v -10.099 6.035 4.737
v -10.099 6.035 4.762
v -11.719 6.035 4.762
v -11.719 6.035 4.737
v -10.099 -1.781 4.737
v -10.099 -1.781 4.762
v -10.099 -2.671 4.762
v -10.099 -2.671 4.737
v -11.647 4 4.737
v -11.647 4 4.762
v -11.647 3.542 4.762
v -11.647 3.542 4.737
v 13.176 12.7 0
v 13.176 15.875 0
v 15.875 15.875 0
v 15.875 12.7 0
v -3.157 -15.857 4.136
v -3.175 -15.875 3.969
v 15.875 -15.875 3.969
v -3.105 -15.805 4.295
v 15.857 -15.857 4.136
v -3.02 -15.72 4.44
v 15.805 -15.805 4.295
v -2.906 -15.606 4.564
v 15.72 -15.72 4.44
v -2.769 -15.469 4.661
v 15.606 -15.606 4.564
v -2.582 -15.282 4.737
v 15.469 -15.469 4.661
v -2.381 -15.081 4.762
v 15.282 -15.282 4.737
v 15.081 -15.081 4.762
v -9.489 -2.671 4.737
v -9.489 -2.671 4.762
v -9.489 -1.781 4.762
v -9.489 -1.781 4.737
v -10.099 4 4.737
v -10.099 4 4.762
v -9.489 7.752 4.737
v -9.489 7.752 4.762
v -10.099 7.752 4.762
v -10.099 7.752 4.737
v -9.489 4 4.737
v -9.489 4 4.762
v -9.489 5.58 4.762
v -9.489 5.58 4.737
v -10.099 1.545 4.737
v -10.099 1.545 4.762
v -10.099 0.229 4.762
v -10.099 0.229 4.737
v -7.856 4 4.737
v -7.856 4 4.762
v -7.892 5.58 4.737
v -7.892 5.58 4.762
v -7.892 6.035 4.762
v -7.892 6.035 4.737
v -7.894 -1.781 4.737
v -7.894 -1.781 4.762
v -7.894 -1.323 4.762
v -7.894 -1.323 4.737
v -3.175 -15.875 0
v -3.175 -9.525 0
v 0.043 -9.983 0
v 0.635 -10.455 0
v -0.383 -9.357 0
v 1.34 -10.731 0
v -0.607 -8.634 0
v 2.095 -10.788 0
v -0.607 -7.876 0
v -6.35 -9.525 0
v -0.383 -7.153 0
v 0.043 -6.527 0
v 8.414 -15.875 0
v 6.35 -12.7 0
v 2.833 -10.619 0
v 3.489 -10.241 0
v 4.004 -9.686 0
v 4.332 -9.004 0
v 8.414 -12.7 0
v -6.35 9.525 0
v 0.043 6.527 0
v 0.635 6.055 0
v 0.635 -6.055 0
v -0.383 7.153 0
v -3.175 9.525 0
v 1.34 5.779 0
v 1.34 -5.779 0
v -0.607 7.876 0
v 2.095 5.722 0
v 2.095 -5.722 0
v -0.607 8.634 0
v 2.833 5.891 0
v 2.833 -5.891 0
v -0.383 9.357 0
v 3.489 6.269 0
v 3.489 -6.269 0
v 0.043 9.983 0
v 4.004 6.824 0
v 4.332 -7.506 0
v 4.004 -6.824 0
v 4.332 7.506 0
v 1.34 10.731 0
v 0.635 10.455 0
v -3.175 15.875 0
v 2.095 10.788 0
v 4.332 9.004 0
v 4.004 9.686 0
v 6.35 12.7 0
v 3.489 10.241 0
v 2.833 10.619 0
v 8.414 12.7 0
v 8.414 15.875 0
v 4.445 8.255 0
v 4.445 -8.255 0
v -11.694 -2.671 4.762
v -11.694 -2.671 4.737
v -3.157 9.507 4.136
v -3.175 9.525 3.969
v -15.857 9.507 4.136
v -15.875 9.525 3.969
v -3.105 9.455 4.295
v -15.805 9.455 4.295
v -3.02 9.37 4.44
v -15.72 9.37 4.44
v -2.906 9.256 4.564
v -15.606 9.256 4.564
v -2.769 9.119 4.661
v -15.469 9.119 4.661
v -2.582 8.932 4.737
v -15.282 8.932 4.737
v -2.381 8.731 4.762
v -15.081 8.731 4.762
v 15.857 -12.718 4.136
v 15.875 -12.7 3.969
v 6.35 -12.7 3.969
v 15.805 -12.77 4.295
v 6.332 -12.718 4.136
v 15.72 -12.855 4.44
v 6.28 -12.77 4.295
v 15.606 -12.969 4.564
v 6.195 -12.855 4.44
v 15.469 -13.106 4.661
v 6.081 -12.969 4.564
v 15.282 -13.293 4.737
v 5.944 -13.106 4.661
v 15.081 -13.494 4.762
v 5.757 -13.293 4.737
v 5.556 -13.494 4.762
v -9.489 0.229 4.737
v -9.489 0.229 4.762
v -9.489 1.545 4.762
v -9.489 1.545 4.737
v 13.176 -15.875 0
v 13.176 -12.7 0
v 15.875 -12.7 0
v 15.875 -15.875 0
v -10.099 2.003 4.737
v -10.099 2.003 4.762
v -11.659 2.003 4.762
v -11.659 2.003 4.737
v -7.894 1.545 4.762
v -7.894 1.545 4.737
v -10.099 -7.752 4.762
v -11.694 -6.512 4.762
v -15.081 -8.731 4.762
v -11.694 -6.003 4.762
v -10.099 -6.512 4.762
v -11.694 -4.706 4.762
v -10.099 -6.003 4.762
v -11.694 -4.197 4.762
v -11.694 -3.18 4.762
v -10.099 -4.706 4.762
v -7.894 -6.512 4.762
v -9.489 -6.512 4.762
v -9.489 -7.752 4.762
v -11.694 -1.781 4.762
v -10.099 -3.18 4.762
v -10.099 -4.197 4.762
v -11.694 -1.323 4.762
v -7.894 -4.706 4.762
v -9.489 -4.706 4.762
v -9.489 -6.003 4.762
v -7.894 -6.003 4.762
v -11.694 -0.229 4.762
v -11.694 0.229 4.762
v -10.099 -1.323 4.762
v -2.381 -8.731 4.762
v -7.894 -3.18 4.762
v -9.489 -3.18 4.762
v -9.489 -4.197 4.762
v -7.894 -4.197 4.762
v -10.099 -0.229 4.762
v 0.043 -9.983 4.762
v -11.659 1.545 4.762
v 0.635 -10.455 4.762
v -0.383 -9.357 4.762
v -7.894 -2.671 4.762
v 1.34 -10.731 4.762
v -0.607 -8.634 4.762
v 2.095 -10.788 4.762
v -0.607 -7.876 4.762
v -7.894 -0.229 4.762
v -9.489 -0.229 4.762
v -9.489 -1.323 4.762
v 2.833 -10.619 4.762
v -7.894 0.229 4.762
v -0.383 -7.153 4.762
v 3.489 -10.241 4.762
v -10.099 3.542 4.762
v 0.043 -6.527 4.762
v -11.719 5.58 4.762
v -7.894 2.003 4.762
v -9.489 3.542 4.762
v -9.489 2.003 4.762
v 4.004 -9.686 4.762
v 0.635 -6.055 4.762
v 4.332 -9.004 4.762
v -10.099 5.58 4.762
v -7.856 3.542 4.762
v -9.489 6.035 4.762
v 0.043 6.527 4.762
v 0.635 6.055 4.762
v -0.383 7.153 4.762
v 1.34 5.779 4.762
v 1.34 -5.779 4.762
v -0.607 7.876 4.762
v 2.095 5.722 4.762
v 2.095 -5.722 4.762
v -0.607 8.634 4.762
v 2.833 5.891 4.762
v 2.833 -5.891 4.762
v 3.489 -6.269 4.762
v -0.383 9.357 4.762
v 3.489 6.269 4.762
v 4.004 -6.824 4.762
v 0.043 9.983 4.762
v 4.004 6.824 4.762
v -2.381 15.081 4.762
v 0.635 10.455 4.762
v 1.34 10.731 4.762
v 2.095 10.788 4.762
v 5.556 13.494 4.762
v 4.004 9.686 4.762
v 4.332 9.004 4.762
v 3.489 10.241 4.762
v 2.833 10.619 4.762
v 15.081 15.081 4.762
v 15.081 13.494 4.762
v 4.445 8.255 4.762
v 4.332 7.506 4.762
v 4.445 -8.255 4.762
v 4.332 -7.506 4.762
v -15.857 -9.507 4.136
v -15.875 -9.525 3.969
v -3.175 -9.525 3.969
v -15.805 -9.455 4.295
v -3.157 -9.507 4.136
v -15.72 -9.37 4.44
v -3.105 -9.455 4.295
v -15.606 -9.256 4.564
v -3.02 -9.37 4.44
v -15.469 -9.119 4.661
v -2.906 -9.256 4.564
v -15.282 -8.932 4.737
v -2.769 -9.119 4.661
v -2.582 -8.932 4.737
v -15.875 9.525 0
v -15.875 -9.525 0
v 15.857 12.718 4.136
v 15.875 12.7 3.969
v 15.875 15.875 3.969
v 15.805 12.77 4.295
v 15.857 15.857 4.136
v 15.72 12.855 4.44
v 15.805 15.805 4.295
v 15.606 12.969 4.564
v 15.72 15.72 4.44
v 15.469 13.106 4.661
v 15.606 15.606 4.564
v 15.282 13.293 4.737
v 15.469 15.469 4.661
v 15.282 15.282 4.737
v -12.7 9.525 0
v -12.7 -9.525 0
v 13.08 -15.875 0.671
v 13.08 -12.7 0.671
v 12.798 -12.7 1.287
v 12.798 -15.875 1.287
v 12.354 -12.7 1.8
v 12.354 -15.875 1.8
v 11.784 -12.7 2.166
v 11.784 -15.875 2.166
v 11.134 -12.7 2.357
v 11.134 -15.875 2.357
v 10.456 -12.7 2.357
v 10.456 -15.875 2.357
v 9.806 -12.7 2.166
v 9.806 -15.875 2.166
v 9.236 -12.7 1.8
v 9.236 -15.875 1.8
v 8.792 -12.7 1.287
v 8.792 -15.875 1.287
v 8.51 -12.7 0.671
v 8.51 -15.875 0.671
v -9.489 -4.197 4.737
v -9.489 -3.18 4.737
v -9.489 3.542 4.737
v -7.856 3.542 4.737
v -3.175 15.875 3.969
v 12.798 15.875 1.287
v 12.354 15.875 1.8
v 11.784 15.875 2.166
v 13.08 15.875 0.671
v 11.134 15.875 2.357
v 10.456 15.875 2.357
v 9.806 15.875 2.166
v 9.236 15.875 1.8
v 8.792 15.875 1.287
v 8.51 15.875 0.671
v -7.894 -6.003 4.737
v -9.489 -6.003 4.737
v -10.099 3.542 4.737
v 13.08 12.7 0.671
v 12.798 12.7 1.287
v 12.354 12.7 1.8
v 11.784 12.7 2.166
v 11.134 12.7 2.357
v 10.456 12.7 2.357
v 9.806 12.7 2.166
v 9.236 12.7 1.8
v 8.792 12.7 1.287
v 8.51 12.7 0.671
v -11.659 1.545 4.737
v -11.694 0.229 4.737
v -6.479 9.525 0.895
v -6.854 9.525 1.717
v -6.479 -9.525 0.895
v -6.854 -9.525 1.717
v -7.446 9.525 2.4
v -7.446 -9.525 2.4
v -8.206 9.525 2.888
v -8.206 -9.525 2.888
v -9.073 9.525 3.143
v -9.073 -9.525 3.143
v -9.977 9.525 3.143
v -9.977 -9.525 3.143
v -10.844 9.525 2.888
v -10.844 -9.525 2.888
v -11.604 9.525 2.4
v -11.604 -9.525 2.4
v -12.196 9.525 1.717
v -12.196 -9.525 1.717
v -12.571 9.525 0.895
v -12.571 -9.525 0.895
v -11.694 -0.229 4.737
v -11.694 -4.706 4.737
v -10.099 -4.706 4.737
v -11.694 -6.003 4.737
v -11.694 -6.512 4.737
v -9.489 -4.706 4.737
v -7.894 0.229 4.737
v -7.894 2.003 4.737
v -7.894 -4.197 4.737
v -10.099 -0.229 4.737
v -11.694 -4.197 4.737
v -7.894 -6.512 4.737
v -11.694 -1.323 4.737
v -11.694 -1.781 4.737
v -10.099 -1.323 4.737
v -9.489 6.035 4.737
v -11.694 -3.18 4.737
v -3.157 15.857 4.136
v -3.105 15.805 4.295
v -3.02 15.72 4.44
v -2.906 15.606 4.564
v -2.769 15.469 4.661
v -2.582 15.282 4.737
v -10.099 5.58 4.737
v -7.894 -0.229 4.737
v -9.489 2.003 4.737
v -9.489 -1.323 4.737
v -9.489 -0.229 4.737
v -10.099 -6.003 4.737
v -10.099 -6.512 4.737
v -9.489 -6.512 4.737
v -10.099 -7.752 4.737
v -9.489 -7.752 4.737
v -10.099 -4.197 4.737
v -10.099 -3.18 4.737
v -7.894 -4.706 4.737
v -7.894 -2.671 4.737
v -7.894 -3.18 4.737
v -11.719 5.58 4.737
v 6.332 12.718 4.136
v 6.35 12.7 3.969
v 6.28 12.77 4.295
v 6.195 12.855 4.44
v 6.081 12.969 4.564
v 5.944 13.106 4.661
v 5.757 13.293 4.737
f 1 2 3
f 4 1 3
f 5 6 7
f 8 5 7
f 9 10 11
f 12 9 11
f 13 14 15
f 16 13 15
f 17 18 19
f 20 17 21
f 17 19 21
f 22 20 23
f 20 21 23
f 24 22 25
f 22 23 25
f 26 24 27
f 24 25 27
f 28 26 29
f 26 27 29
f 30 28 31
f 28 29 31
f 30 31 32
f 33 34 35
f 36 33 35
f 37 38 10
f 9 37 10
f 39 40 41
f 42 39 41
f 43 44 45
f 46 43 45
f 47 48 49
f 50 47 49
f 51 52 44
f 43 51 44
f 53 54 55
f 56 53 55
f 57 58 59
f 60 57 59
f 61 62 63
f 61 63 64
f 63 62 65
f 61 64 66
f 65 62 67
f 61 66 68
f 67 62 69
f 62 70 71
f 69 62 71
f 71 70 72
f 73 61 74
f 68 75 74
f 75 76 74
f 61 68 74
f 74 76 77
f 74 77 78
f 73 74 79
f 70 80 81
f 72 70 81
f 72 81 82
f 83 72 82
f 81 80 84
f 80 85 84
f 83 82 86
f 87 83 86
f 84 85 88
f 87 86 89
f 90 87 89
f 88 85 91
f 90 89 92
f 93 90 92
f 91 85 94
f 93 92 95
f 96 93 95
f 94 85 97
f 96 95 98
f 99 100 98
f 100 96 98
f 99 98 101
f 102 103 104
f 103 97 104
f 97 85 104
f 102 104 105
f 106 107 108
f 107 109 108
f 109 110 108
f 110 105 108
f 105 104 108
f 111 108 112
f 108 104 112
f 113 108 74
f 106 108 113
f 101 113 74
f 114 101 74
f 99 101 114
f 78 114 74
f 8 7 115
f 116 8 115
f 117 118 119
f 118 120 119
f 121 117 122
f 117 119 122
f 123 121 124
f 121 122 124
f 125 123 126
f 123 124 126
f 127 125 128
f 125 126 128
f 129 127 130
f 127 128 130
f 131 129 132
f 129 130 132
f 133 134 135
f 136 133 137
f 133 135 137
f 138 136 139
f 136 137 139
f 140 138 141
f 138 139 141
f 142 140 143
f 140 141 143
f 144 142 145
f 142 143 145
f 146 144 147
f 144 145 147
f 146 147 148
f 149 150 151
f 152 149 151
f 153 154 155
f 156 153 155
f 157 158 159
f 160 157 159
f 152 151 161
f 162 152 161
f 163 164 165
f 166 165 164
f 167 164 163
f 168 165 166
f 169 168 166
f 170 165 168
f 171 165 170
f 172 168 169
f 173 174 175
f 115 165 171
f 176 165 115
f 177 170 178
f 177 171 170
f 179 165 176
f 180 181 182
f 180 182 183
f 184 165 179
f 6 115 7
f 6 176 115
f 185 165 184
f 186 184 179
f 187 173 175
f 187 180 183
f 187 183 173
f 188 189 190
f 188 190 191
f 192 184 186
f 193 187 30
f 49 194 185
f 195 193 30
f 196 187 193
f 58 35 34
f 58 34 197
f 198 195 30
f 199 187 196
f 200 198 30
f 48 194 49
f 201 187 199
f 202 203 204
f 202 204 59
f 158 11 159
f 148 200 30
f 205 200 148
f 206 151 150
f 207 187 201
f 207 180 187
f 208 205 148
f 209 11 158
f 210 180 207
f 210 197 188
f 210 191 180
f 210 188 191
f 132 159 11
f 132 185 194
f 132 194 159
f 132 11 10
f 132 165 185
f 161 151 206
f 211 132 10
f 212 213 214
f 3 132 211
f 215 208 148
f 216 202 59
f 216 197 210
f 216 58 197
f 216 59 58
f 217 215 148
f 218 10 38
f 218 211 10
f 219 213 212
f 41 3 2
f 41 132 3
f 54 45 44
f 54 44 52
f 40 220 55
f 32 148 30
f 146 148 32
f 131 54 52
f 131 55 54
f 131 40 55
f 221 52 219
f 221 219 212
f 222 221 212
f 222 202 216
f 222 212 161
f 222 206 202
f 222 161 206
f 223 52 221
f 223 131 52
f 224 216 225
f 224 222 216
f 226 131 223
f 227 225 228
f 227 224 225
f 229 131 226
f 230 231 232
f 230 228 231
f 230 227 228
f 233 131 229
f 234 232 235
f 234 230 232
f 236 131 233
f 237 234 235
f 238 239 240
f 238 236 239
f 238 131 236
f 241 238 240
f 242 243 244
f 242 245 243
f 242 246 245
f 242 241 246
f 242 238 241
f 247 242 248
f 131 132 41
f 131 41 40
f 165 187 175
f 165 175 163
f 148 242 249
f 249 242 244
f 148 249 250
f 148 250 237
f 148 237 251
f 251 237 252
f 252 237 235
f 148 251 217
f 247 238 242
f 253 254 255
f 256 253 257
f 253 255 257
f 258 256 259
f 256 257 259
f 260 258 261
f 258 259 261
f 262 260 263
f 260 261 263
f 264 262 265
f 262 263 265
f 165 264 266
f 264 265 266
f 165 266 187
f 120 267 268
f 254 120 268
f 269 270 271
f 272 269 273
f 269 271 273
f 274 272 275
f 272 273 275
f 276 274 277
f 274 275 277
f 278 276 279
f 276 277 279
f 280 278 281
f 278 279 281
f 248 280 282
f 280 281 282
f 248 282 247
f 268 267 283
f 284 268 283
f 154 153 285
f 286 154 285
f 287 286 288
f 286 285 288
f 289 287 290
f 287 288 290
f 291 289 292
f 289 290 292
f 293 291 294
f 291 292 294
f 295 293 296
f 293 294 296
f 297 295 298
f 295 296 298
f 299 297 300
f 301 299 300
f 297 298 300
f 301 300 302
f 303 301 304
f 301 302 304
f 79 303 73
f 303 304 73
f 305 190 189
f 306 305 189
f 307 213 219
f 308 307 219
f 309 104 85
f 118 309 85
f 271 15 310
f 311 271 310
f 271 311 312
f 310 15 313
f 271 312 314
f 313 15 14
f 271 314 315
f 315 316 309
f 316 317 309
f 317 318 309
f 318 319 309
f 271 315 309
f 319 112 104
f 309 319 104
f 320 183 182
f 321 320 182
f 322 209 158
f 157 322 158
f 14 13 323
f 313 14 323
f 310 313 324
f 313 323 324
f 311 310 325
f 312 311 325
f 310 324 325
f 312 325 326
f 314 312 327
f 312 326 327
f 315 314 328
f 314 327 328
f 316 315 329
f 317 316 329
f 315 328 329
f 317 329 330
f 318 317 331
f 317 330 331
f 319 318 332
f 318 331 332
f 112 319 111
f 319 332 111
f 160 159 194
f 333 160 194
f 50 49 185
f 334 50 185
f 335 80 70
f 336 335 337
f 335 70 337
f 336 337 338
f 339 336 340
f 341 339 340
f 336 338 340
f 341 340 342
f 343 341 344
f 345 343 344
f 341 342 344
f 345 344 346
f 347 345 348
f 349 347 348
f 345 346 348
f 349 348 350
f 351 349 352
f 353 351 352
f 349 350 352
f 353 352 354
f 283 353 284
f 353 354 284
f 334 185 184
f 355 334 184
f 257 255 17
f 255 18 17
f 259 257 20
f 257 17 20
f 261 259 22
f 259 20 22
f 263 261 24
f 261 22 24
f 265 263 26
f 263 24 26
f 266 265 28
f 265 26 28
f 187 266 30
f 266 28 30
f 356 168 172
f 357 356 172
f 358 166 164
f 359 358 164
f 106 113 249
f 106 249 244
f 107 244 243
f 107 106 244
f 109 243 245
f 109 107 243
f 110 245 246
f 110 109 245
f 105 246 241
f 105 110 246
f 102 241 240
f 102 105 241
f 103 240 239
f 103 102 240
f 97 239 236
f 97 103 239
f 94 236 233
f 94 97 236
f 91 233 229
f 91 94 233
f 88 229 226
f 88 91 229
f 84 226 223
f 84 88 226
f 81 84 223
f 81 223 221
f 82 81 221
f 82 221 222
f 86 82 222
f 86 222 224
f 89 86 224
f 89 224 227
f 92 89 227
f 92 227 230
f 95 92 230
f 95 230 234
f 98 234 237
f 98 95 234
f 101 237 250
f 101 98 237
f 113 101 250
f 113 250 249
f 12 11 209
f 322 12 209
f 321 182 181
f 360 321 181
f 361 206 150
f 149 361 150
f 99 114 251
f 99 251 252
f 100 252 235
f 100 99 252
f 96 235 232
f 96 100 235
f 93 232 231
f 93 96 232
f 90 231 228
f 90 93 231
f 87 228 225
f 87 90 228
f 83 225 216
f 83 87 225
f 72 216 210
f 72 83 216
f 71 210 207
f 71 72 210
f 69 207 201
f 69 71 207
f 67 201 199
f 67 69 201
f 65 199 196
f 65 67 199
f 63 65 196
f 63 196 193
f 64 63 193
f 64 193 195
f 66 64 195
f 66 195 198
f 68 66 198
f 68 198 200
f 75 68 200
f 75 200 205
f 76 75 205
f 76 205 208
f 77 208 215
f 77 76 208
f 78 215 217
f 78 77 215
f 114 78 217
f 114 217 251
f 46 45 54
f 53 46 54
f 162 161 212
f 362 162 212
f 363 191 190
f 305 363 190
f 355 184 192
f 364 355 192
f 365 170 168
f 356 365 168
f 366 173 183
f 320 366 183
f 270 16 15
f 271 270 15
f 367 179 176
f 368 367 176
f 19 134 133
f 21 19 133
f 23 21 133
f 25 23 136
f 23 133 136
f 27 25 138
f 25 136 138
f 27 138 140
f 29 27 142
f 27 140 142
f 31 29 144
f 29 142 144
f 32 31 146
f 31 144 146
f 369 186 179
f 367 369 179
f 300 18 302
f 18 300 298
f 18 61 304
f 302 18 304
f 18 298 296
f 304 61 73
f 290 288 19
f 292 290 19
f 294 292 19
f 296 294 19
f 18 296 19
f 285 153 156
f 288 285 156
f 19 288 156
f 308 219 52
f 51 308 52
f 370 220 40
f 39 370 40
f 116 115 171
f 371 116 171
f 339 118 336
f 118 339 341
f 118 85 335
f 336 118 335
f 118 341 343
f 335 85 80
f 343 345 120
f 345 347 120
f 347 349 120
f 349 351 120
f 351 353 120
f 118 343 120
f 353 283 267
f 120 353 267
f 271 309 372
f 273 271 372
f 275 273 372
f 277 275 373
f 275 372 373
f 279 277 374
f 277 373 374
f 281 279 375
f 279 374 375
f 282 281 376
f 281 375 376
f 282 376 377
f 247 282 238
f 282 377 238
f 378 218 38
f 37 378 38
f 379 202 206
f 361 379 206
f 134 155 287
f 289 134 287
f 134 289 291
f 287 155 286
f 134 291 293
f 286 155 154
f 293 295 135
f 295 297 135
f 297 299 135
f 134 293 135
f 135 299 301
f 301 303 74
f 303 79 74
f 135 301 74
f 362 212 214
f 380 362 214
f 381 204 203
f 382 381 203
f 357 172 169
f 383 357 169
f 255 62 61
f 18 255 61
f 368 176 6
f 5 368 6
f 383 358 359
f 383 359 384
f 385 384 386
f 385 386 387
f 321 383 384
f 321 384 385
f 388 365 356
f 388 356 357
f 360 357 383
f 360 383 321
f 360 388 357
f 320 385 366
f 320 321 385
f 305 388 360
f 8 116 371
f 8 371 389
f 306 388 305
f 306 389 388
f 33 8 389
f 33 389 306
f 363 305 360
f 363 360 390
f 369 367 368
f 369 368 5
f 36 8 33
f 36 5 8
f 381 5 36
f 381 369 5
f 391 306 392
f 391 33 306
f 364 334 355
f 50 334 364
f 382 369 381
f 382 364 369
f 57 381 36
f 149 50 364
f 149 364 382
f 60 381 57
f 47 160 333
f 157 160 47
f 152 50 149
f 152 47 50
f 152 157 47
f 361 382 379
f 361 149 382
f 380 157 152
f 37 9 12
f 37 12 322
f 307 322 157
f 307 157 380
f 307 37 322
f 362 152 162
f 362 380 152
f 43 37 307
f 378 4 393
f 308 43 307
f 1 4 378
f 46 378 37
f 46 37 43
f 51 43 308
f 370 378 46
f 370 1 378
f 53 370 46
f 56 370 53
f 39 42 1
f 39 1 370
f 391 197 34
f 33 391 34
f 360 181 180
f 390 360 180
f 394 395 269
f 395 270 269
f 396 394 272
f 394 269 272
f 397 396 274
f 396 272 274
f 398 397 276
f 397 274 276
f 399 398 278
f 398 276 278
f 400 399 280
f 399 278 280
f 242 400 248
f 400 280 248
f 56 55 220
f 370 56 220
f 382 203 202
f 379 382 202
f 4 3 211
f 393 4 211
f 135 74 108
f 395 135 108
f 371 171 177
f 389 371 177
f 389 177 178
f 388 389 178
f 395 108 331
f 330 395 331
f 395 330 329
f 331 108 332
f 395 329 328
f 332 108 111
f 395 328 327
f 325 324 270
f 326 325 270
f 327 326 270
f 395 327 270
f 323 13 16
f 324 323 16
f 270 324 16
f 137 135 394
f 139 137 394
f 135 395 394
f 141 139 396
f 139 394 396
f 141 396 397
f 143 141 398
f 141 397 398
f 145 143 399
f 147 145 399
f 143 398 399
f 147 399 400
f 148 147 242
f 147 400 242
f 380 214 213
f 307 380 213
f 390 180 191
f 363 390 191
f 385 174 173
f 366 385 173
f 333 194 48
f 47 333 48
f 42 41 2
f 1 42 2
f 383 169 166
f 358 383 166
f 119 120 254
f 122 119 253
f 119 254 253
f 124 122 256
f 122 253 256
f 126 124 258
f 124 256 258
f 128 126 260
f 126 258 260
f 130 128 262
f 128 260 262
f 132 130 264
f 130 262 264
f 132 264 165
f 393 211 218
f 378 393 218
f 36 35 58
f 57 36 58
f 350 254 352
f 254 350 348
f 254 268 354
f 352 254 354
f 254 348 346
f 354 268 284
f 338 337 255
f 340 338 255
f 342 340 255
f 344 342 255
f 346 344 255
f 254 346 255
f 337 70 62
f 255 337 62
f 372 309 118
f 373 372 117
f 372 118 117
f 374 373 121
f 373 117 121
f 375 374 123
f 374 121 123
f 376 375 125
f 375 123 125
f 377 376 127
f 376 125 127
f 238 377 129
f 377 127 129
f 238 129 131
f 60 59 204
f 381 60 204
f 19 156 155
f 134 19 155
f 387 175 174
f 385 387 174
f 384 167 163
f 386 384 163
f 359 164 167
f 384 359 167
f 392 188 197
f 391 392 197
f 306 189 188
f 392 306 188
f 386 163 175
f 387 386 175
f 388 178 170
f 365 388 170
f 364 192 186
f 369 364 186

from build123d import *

# Parameters (mm, degrees)
F0_R     = 2.54
F1_DEPTH = 4.7625
F2_R     = 0.79375
F4_DEPTH = 25.401
F6_DEPTH = 31.751
F8_DEPTH = 0.0254


with BuildPart() as f1:
    # F0 (on Top) → F1 (new body)
    with BuildSketch(Plane.XY):
        Polygon((15.875, 12.7), (15.875, 15.875), (-3.175, 15.875), (-3.175, 9.525), (-15.875, 9.525), (-15.875, -9.525), (-3.175, -9.525), (-3.175, -15.875), (15.875, -15.875), (15.875, -12.7), (6.35, -12.7), (6.35, 12.7), align=None)
        with Locations((1.905, -8.255)):
            Circle(F0_R, mode=Mode.SUBTRACT)
        with Locations((1.905, 8.255)):
            Circle(F0_R, mode=Mode.SUBTRACT)
    extrude(amount=F1_DEPTH)

    # F2
    f2_edges = [f1.edges().sort_by_distance(p)[0] for p in [
        (-9.525, 9.525, 4.7625),
        (-9.525, -9.525, 4.7625),
        (6.35, 15.875, 4.7625),
        (11.1125, 12.7, 4.7625),
        (6.35, 0, 4.7625),
        (15.875, 14.2875, 4.7625),
        (11.1125, -12.7, 4.7625),
        (15.875, -14.2875, 4.7625),
        (6.35, -15.875, 4.7625),
        (-3.175, -12.7, 4.7625),
        (-15.875, 0, 4.7625),
        (-3.175, 12.7, 4.7625),
    ]]
    fillet(f2_edges, radius=F2_R)

    # F3 (on face) → F4 (cut, through all)
    with BuildSketch(Plane.XZ.offset(9.525)):
        with BuildLine():
            Line((-12.7, 0), (-6.35, 0))
            ThreePointArc((-6.35, 0), (-9.525, 3.175), (-12.7, 0))
        make_face()
    extrude(amount=-F4_DEPTH, mode=Mode.SUBTRACT)

    # F5 (on face) → F6 (cut, through all)
    with BuildSketch(Plane.XZ.offset(15.875)):
        with BuildLine():
            Line((8.41375, 0), (13.17625, 0))
            ThreePointArc((13.17625, 0), (10.795, 2.38125), (8.41375, 0))
        make_face()
    extrude(amount=-F6_DEPTH, mode=Mode.SUBTRACT)

    # F7 (on face) → F8 (cut)
    with BuildSketch(Plane.XY.offset(4.7625)):
        Polygon((-10.099244, -6.511544), (-10.099244, -7.751831), (-9.488716, -7.751831), (-9.488716, -6.511544), (-7.894327, -6.511544), (-7.894327, -6.002771), (-9.488716, -6.002771), (-9.488716, -4.706035), (-7.894327, -4.706035), (-7.894327, -4.197262), (-9.488716, -4.197262), (-9.488716, -3.179715), (-7.894327, -3.179715), (-7.894327, -2.670942), (-9.488716, -2.670942), (-9.488716, -1.780588), (-7.894327, -1.780588), (-7.894327, -1.322692), (-9.488716, -1.322692), (-9.488716, -0.228829), (-7.894327, -0.228829), (-7.894327, 0.228829), (-9.488716, 0.228829), (-9.488716, 1.545488), (-7.894327, 1.545488), (-7.894327, 2.003385), (-9.488716, 2.003385), (-9.488716, 3.542424), (-7.856169, 3.542424), (-7.856169, 4.000321), (-9.488716, 4.000321), (-9.488716, 5.580434), (-7.892068, 5.580434), (-7.892068, 6.035207), (-9.488716, 6.035207), (-9.488716, 7.751831), (-10.099244, 7.751831), (-10.099244, 6.035207), (-11.719226, 6.035207), (-11.719226, 5.580434), (-10.099244, 5.580434), (-10.099244, 4.000321), (-11.646531, 4.000321), (-11.646531, 3.542424), (-10.099244, 3.542424), (-10.099244, 2.003385), (-11.659251, 2.003385), (-11.659251, 1.545488), (-10.099244, 1.545488), (-10.099244, 0.228829), (-11.693633, 0.228829), (-11.693633, -0.228829), (-10.099244, -0.228829), (-10.099244, -1.322692), (-11.693633, -1.322692), (-11.693633, -1.780588), (-10.099244, -1.780588), (-10.099244, -2.670942), (-11.693633, -2.670942), (-11.693633, -3.179715), (-10.099244, -3.179715), (-10.099244, -4.197262), (-11.693633, -4.197262), (-11.693633, -4.706035), (-10.099244, -4.706035), (-10.099244, -6.002771), (-11.693633, -6.002771), (-11.693633, -6.511544), align=None)
    extrude(amount=-F8_DEPTH, mode=Mode.SUBTRACT)


solid = f1.part
